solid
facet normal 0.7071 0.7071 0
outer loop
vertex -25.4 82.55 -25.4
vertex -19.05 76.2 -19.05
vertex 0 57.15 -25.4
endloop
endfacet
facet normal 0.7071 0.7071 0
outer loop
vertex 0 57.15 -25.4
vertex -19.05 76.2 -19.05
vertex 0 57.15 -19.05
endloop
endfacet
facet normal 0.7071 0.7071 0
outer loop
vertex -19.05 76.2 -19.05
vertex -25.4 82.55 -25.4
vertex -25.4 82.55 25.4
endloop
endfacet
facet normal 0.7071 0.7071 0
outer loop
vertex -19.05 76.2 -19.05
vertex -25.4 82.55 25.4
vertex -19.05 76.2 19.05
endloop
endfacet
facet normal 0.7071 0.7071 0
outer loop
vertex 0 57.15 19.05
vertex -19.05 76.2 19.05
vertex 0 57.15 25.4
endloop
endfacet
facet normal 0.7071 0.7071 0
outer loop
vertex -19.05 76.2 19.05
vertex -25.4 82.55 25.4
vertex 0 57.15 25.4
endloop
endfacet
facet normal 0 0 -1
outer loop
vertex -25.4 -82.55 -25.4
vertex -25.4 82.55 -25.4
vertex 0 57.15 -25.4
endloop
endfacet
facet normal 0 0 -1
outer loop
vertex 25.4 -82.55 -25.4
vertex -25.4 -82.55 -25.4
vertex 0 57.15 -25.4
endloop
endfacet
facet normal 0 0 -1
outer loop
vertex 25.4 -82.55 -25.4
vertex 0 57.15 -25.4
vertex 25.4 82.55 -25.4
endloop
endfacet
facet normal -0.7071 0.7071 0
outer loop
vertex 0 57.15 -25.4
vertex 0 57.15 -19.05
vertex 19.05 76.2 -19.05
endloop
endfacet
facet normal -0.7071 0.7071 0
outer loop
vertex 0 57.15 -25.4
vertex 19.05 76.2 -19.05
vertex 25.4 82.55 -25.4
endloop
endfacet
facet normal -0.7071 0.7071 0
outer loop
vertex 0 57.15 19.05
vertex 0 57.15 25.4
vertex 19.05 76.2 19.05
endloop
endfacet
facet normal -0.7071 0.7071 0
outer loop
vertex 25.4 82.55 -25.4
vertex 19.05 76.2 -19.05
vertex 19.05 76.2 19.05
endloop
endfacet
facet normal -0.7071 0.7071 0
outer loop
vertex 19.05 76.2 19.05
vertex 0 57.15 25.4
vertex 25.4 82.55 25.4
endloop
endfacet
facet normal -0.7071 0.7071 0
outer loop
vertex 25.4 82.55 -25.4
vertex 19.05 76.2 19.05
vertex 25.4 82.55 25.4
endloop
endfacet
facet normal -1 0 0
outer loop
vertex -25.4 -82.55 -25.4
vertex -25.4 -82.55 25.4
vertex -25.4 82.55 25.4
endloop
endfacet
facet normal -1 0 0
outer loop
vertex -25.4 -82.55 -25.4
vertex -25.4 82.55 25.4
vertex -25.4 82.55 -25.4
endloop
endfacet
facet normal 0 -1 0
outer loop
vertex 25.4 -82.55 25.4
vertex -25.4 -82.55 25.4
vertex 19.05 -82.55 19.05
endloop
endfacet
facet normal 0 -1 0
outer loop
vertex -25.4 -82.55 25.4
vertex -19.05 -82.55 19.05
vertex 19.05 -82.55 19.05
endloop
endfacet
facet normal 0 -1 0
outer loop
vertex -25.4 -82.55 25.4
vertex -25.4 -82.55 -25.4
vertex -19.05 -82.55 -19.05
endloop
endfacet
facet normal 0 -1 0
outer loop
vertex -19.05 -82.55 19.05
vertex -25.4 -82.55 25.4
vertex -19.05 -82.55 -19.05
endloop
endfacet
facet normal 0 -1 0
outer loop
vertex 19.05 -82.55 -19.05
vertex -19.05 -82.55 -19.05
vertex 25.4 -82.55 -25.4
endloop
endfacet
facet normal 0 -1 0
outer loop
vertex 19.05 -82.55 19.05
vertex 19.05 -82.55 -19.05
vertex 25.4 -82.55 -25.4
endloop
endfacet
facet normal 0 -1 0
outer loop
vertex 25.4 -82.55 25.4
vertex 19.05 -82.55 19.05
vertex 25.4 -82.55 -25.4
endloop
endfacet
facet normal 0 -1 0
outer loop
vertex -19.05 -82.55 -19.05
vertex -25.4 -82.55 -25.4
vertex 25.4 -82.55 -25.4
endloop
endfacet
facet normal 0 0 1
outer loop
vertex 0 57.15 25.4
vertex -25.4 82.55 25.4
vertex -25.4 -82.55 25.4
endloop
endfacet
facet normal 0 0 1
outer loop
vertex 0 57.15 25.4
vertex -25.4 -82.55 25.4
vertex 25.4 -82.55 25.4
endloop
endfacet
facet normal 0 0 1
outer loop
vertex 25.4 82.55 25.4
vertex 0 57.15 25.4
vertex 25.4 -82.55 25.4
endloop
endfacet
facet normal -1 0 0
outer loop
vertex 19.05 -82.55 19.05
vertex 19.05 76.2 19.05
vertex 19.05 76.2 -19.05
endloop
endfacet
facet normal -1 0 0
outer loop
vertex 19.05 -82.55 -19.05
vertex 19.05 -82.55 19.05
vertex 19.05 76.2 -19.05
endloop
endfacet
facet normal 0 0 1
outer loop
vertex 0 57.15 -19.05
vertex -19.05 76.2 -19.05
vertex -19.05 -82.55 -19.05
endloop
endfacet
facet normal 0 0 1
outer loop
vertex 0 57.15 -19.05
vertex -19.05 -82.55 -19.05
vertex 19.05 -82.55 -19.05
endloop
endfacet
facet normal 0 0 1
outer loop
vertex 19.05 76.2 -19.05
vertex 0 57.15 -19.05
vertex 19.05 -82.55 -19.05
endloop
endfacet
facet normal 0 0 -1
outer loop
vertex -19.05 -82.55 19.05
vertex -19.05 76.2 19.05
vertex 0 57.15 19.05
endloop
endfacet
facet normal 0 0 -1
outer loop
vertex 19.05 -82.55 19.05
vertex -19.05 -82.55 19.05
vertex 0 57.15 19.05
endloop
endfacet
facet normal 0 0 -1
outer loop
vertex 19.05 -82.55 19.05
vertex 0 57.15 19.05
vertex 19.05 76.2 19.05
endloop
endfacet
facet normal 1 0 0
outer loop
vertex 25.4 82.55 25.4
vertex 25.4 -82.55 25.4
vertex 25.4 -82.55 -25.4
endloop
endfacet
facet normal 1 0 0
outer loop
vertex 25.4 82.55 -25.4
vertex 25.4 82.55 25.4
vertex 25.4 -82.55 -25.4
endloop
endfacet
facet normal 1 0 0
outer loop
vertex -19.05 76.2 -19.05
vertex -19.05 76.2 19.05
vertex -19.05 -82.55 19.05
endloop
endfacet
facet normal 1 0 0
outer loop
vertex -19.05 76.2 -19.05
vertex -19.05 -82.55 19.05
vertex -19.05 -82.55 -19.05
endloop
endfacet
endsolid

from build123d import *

# Parameters (mm, degrees)
SKETCH1_W               = 50.8
SKETCH1_H               = 50.8
SKETCH1_W_2             = 38.1
SKETCH1_H_2             = 38.1
BOSS_EXTRUDE1_DEPTH     = 82.55
CUT_EXTRUDE1_DEPTH      = 1
CUT_EXTRUDE1_DEPTH_BACK = 51.8


with BuildPart() as part:
    # Sketch1 → Boss-Extrude1 (new body, symmetric)
    with BuildSketch(Plane(origin=(0, 0, 0), x_dir=(1, 0, 0), z_dir=(0, 1, 0))):
        Rectangle(SKETCH1_W, SKETCH1_H)
        Rectangle(SKETCH1_W_2, SKETCH1_H_2, mode=Mode.SUBTRACT)
    extrude(amount=BOSS_EXTRUDE1_DEPTH, both=True)

    # Sketch3 → Cut-Extrude1 (cut, two sides)
    with BuildSketch(Plane.XY.offset(25.4)) as cut_extrude1_sk:
        Polygon((-276.760445395, 333.910445395), (-25.4, 82.55), (0, 57.15), (25.4, 82.55), (276.760445395, 333.910445395), (276.760445395, 1044.865147239), (-276.760445395, 1044.865147239), align=None)
    extrude(amount=CUT_EXTRUDE1_DEPTH, mode=Mode.SUBTRACT)
    extrude(cut_extrude1_sk.sketch, amount=-CUT_EXTRUDE1_DEPTH_BACK, mode=Mode.SUBTRACT)


solid = part.part
